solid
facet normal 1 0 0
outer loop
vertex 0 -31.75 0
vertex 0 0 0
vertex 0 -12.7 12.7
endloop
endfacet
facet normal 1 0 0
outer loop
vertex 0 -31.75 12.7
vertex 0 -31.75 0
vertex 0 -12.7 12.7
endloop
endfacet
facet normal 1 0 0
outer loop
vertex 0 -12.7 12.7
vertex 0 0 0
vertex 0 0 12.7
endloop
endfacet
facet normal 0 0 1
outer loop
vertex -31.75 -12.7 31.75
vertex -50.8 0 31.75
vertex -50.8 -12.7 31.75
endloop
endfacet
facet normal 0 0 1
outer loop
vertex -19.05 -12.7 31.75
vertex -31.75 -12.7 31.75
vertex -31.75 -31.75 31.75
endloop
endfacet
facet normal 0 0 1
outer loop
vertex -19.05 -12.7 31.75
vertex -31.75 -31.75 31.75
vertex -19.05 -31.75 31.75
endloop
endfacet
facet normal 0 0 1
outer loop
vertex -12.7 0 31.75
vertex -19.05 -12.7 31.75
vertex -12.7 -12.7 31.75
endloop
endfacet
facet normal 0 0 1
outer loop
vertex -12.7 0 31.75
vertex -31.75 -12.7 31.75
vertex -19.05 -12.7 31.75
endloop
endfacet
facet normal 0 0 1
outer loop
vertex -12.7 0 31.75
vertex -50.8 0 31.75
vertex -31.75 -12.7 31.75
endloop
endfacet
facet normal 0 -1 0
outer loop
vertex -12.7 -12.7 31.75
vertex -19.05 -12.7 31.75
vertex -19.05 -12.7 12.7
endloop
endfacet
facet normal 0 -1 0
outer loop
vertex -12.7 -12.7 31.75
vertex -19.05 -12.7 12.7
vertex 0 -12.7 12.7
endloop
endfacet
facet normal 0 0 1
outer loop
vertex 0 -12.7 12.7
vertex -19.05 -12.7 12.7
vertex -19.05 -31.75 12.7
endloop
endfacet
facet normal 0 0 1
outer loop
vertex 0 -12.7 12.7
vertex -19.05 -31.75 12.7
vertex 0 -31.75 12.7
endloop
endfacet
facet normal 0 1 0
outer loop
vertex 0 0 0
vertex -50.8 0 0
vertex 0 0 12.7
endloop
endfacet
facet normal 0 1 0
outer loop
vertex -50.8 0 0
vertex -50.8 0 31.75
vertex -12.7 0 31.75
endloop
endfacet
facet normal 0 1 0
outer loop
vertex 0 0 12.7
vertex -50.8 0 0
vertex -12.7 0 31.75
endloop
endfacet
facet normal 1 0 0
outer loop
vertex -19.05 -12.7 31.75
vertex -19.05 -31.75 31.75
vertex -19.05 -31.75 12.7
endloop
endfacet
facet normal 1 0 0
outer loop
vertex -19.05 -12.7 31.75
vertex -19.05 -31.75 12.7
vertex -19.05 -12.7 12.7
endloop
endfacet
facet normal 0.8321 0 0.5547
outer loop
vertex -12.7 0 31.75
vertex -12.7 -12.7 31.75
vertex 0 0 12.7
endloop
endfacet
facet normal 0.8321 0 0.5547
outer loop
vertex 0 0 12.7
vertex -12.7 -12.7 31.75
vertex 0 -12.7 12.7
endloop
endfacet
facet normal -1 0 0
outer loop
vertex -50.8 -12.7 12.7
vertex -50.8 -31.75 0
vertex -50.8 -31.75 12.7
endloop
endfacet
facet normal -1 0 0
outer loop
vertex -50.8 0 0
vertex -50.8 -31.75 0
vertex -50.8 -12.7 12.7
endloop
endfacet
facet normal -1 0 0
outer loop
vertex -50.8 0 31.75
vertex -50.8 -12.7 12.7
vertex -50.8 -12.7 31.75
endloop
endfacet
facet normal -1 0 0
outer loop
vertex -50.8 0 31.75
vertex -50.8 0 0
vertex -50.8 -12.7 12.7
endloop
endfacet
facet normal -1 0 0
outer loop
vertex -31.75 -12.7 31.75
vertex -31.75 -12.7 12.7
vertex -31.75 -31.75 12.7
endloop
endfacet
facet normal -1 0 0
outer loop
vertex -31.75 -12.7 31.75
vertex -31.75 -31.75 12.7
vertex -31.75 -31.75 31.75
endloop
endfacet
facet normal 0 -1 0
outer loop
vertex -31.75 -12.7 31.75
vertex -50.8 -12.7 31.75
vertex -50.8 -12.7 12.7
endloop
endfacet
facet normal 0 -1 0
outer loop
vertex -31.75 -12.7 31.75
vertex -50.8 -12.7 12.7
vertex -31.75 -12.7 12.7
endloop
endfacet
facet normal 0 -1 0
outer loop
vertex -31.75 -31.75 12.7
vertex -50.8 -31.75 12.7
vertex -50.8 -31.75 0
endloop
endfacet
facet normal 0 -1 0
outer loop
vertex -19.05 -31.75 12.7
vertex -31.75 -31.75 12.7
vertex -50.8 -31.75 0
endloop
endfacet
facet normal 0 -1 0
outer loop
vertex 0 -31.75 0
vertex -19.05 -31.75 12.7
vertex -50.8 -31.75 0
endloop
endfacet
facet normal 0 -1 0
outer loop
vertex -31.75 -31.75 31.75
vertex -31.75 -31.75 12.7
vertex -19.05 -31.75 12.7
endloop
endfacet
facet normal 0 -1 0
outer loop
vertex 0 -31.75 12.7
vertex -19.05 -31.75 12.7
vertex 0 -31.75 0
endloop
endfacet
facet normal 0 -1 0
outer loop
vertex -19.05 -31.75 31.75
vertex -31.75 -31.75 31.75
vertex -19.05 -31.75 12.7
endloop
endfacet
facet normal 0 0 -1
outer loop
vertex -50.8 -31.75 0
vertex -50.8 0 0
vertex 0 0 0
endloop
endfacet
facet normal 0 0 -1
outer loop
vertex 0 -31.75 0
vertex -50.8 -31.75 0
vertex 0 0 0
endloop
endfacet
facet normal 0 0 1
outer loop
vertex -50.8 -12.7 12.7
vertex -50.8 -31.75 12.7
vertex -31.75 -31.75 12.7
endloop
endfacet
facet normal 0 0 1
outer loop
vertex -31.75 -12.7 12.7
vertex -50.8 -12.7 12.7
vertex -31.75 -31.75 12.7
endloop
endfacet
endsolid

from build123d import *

# Parameters (mm, degrees)
F0_W     = 50.8
F0_H     = 31.75
F1_DEPTH = 31.75
F2_W     = 19.05
F2_H     = 19.05
F3_DEPTH = 19.05
F4_W     = 19.05
F4_H     = 19.05
F5_DEPTH = 19.05
F7_DEPTH = 12.7


with BuildPart() as f1:
    # F0 (on Front) → F1 (new body)
    with BuildSketch(Plane.XZ):
        with Locations((-25.4, 15.875)):
            Rectangle(F0_W, F0_H)
    extrude(amount=F1_DEPTH)

    # F2 (on face) → F3 (cut)
    with BuildSketch(Plane.XY.offset(31.75)):
        with Locations((-9.525, -22.225)):
            Rectangle(F2_W, F2_H)
    extrude(amount=-F3_DEPTH, mode=Mode.SUBTRACT)

    # F4 (on face) → F5 (cut)
    with BuildSketch(Plane.XZ.offset(31.75)):
        with Locations((-41.275, 22.225)):
            Rectangle(F4_W, F4_H)
    extrude(amount=-F5_DEPTH, mode=Mode.SUBTRACT)

    # F6 (on face) → F7 (cut)
    with BuildSketch(Plane.XZ.offset(12.7)):
        Polygon((0, 31.75), (-12.7, 31.75), (0, 12.7), align=None)
    extrude(amount=-F7_DEPTH, mode=Mode.SUBTRACT)


solid = f1.part
